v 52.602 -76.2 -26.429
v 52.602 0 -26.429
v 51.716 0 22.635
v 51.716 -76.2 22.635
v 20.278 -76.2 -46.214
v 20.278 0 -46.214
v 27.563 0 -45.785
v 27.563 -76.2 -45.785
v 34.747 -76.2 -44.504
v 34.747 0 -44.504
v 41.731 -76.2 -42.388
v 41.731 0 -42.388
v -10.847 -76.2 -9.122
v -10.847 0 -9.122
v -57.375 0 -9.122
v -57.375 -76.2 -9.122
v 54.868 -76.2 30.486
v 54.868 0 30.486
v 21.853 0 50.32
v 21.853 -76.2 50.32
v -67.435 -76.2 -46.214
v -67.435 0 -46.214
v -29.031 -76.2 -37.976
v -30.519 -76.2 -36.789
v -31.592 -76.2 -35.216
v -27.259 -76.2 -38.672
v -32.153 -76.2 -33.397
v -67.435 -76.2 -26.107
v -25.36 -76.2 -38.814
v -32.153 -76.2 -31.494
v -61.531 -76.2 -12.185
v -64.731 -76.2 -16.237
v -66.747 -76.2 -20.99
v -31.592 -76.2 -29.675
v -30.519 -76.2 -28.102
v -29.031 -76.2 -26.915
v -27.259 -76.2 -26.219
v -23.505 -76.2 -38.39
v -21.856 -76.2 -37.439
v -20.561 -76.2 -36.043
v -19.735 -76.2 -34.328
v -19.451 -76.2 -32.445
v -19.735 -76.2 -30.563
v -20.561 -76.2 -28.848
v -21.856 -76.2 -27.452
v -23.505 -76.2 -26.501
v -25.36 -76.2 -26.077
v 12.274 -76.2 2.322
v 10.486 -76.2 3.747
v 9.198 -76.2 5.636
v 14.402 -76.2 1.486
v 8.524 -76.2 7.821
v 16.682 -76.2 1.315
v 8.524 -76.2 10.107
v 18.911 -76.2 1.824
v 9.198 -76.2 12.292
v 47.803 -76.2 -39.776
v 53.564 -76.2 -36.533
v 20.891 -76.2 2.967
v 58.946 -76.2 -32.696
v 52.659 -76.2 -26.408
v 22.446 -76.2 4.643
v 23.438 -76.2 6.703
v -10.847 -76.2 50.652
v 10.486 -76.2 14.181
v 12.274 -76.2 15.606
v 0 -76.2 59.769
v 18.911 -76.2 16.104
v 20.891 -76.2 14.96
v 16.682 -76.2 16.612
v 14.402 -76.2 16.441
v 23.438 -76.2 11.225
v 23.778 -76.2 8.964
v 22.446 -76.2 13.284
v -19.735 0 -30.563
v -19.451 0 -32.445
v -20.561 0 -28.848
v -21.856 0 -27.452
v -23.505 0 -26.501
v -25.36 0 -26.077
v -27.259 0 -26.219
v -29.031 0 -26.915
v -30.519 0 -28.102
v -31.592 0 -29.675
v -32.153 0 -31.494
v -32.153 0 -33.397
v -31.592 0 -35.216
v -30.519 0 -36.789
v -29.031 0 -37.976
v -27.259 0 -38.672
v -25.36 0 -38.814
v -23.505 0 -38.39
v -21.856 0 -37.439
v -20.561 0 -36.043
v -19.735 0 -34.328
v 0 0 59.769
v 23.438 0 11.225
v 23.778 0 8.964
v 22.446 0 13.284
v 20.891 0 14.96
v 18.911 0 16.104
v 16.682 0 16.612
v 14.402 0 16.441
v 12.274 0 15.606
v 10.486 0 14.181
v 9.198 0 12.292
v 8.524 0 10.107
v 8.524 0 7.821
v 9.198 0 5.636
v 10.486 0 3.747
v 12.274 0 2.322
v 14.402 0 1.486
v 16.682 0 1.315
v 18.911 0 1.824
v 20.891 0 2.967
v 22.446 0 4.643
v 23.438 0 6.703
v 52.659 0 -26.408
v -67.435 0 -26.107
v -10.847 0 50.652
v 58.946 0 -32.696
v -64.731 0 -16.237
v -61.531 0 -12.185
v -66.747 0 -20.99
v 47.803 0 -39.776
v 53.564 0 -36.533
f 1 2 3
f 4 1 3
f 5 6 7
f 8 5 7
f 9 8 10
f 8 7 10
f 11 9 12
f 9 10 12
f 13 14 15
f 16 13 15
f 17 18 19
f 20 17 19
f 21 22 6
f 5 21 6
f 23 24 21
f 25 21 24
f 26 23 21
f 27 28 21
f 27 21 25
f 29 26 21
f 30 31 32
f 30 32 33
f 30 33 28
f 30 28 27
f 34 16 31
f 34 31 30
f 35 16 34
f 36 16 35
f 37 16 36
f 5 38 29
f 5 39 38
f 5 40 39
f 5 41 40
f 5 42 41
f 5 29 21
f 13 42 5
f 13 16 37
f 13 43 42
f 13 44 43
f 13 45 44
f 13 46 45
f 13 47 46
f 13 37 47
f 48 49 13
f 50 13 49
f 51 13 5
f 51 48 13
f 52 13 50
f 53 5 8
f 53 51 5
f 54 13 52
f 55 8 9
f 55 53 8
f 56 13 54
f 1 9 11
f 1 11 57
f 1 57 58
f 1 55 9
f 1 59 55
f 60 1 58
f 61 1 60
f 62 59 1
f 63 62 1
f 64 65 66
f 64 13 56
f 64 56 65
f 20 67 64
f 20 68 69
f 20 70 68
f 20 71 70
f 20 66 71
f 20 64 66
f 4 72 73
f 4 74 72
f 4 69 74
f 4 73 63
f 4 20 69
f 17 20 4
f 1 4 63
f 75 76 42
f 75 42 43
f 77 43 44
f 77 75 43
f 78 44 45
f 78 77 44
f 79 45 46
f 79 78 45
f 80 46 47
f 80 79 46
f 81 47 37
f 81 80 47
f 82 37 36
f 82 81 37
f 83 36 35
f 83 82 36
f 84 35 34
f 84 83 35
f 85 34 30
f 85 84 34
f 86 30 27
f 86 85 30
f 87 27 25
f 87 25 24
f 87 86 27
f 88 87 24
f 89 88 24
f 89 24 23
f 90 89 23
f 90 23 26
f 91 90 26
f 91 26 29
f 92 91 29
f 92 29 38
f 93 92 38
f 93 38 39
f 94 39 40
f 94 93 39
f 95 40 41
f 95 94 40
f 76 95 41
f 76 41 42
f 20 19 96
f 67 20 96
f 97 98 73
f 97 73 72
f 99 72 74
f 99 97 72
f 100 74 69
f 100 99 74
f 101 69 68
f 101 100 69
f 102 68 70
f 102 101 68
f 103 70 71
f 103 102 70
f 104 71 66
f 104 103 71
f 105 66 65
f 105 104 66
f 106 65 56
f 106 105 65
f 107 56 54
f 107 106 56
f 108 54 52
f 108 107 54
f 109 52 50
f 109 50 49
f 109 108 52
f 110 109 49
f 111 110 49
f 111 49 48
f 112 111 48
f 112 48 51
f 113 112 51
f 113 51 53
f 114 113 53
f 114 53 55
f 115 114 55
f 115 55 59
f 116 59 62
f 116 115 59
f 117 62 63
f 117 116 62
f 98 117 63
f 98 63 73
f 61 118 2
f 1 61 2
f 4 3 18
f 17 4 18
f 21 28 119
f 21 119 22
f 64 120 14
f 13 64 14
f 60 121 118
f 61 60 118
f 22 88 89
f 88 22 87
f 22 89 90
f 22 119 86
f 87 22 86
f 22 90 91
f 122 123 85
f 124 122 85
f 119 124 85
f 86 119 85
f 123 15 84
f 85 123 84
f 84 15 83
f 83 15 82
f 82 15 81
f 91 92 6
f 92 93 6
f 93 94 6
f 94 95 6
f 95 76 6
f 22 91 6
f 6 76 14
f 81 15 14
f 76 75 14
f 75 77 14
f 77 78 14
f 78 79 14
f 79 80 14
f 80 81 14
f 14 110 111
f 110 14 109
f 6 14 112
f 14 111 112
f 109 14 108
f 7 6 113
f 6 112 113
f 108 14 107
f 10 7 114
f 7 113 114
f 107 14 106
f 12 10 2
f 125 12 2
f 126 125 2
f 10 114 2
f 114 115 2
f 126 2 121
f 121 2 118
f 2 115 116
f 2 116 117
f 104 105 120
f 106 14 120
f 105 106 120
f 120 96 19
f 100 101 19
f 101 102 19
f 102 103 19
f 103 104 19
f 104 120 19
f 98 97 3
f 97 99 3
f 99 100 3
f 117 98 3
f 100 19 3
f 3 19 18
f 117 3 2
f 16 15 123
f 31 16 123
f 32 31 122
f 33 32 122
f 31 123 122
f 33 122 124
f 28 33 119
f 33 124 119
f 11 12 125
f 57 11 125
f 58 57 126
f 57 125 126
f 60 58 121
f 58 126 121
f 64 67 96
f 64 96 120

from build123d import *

# Parameters (mm, degrees)
F0_R     = 6.386329
F0_R_2   = 7.669861
F1_DEPTH = 76.2


with BuildPart() as f1:
    # F0 (on Front) → F1 (new body)
    with BuildSketch(Plane.XZ):
        with BuildLine():
            Line((-59.575226, -25.464874), (-59.575226, -46.214029))
            Line((-59.575226, -46.214029), (0, -46.214029))
            Line((0, -46.214029), (0, -14.775913))
            Line((0, -14.775913), (-10.846913, -14.775913))
            Line((-10.846913, -14.775913), (-51.715698, -14.775913))
            ThreePointArc((-51.715698, -14.775913), (-57.398857, -18.831133), (-59.575226, -25.464874))
        make_face()
        with Locations((-25.837737, -32.445498)):
            Circle(F0_R, mode=Mode.SUBTRACT)
        with BuildLine():
            Line((-67.434758, -46.214029), (-59.575226, -46.214029))
            Line((-59.575226, -46.214029), (-59.575226, -25.464874))
            ThreePointArc((-59.575226, -25.464874), (-57.398857, -18.831133), (-51.715698, -14.775913))
            Line((-51.715698, -14.775913), (-10.846913, -14.775913))
            Line((-10.846913, -14.775913), (-10.846913, -9.121778))
            Line((-10.846913, -9.121778), (-57.374559, -9.121778))
            ThreePointArc((-57.374559, -9.121778), (-64.731001, -16.236777), (-67.434758, -26.107447))
            Line((-67.434758, -26.107447), (-67.434758, -46.214029))
        make_face()
        Polygon((-10.846913, -14.775913), (0, -14.775913), (9.588626, -14.775913), (21.832943, -26.408015), (44.932198, -17.93753), (44.932198, 22.635443), (12.734826, 42.775784), (-10.846913, 50.652135), (-10.846913, -9.121778), align=None)
        with Locations((16.108637, 8.963856)):
            Circle(F0_R_2, mode=Mode.SUBTRACT)
        with BuildLine():
            Line((0, -14.775913), (0, -46.214029))
            Line((0, -46.214029), (20.277588, -46.214029))
            ThreePointArc((20.277588, -46.214029), (31.173466, -45.250121), (41.730902, -42.388338))
            ThreePointArc((41.730902, -42.388338), (37.981593, -41.004981), (34.739118, -38.668882))
            Line((34.739118, -38.668882), (30.417925, -34.563749))
            Line((30.417925, -34.563749), (21.832943, -26.408015))
            Line((21.832943, -26.408015), (9.588626, -14.775913))
            Line((9.588626, -14.775913), (0, -14.775913))
        make_face()
        with BuildLine():
            ThreePointArc((34.739118, -38.668882), (37.981593, -41.004981), (41.730902, -42.388338))
            ThreePointArc((41.730902, -42.388338), (50.726835, -38.231397), (58.946468, -32.69564))
            Line((58.946468, -32.69564), (52.658845, -26.408015))
            Line((52.658845, -26.408015), (52.602403, -26.428712))
            Line((52.602403, -26.428712), (30.417925, -34.563749))
            Line((30.417925, -34.563749), (34.739118, -38.668882))
        make_face()
        Polygon((44.932198, -17.93753), (21.832943, -26.408015), (30.417925, -34.563749), (52.602403, -26.428712), (51.715698, 22.635443), (44.932198, 22.635443), align=None)
        Polygon((21.853101, 50.320085), (12.734826, 42.775784), (44.932198, 22.635443), (51.715698, 22.635443), (54.86754, 30.485805), align=None)
        Polygon((0, 59.769187), (-10.846913, 50.652135), (12.734826, 42.775784), (21.853101, 50.320085), align=None)
    extrude(amount=F1_DEPTH)


solid = f1.part
